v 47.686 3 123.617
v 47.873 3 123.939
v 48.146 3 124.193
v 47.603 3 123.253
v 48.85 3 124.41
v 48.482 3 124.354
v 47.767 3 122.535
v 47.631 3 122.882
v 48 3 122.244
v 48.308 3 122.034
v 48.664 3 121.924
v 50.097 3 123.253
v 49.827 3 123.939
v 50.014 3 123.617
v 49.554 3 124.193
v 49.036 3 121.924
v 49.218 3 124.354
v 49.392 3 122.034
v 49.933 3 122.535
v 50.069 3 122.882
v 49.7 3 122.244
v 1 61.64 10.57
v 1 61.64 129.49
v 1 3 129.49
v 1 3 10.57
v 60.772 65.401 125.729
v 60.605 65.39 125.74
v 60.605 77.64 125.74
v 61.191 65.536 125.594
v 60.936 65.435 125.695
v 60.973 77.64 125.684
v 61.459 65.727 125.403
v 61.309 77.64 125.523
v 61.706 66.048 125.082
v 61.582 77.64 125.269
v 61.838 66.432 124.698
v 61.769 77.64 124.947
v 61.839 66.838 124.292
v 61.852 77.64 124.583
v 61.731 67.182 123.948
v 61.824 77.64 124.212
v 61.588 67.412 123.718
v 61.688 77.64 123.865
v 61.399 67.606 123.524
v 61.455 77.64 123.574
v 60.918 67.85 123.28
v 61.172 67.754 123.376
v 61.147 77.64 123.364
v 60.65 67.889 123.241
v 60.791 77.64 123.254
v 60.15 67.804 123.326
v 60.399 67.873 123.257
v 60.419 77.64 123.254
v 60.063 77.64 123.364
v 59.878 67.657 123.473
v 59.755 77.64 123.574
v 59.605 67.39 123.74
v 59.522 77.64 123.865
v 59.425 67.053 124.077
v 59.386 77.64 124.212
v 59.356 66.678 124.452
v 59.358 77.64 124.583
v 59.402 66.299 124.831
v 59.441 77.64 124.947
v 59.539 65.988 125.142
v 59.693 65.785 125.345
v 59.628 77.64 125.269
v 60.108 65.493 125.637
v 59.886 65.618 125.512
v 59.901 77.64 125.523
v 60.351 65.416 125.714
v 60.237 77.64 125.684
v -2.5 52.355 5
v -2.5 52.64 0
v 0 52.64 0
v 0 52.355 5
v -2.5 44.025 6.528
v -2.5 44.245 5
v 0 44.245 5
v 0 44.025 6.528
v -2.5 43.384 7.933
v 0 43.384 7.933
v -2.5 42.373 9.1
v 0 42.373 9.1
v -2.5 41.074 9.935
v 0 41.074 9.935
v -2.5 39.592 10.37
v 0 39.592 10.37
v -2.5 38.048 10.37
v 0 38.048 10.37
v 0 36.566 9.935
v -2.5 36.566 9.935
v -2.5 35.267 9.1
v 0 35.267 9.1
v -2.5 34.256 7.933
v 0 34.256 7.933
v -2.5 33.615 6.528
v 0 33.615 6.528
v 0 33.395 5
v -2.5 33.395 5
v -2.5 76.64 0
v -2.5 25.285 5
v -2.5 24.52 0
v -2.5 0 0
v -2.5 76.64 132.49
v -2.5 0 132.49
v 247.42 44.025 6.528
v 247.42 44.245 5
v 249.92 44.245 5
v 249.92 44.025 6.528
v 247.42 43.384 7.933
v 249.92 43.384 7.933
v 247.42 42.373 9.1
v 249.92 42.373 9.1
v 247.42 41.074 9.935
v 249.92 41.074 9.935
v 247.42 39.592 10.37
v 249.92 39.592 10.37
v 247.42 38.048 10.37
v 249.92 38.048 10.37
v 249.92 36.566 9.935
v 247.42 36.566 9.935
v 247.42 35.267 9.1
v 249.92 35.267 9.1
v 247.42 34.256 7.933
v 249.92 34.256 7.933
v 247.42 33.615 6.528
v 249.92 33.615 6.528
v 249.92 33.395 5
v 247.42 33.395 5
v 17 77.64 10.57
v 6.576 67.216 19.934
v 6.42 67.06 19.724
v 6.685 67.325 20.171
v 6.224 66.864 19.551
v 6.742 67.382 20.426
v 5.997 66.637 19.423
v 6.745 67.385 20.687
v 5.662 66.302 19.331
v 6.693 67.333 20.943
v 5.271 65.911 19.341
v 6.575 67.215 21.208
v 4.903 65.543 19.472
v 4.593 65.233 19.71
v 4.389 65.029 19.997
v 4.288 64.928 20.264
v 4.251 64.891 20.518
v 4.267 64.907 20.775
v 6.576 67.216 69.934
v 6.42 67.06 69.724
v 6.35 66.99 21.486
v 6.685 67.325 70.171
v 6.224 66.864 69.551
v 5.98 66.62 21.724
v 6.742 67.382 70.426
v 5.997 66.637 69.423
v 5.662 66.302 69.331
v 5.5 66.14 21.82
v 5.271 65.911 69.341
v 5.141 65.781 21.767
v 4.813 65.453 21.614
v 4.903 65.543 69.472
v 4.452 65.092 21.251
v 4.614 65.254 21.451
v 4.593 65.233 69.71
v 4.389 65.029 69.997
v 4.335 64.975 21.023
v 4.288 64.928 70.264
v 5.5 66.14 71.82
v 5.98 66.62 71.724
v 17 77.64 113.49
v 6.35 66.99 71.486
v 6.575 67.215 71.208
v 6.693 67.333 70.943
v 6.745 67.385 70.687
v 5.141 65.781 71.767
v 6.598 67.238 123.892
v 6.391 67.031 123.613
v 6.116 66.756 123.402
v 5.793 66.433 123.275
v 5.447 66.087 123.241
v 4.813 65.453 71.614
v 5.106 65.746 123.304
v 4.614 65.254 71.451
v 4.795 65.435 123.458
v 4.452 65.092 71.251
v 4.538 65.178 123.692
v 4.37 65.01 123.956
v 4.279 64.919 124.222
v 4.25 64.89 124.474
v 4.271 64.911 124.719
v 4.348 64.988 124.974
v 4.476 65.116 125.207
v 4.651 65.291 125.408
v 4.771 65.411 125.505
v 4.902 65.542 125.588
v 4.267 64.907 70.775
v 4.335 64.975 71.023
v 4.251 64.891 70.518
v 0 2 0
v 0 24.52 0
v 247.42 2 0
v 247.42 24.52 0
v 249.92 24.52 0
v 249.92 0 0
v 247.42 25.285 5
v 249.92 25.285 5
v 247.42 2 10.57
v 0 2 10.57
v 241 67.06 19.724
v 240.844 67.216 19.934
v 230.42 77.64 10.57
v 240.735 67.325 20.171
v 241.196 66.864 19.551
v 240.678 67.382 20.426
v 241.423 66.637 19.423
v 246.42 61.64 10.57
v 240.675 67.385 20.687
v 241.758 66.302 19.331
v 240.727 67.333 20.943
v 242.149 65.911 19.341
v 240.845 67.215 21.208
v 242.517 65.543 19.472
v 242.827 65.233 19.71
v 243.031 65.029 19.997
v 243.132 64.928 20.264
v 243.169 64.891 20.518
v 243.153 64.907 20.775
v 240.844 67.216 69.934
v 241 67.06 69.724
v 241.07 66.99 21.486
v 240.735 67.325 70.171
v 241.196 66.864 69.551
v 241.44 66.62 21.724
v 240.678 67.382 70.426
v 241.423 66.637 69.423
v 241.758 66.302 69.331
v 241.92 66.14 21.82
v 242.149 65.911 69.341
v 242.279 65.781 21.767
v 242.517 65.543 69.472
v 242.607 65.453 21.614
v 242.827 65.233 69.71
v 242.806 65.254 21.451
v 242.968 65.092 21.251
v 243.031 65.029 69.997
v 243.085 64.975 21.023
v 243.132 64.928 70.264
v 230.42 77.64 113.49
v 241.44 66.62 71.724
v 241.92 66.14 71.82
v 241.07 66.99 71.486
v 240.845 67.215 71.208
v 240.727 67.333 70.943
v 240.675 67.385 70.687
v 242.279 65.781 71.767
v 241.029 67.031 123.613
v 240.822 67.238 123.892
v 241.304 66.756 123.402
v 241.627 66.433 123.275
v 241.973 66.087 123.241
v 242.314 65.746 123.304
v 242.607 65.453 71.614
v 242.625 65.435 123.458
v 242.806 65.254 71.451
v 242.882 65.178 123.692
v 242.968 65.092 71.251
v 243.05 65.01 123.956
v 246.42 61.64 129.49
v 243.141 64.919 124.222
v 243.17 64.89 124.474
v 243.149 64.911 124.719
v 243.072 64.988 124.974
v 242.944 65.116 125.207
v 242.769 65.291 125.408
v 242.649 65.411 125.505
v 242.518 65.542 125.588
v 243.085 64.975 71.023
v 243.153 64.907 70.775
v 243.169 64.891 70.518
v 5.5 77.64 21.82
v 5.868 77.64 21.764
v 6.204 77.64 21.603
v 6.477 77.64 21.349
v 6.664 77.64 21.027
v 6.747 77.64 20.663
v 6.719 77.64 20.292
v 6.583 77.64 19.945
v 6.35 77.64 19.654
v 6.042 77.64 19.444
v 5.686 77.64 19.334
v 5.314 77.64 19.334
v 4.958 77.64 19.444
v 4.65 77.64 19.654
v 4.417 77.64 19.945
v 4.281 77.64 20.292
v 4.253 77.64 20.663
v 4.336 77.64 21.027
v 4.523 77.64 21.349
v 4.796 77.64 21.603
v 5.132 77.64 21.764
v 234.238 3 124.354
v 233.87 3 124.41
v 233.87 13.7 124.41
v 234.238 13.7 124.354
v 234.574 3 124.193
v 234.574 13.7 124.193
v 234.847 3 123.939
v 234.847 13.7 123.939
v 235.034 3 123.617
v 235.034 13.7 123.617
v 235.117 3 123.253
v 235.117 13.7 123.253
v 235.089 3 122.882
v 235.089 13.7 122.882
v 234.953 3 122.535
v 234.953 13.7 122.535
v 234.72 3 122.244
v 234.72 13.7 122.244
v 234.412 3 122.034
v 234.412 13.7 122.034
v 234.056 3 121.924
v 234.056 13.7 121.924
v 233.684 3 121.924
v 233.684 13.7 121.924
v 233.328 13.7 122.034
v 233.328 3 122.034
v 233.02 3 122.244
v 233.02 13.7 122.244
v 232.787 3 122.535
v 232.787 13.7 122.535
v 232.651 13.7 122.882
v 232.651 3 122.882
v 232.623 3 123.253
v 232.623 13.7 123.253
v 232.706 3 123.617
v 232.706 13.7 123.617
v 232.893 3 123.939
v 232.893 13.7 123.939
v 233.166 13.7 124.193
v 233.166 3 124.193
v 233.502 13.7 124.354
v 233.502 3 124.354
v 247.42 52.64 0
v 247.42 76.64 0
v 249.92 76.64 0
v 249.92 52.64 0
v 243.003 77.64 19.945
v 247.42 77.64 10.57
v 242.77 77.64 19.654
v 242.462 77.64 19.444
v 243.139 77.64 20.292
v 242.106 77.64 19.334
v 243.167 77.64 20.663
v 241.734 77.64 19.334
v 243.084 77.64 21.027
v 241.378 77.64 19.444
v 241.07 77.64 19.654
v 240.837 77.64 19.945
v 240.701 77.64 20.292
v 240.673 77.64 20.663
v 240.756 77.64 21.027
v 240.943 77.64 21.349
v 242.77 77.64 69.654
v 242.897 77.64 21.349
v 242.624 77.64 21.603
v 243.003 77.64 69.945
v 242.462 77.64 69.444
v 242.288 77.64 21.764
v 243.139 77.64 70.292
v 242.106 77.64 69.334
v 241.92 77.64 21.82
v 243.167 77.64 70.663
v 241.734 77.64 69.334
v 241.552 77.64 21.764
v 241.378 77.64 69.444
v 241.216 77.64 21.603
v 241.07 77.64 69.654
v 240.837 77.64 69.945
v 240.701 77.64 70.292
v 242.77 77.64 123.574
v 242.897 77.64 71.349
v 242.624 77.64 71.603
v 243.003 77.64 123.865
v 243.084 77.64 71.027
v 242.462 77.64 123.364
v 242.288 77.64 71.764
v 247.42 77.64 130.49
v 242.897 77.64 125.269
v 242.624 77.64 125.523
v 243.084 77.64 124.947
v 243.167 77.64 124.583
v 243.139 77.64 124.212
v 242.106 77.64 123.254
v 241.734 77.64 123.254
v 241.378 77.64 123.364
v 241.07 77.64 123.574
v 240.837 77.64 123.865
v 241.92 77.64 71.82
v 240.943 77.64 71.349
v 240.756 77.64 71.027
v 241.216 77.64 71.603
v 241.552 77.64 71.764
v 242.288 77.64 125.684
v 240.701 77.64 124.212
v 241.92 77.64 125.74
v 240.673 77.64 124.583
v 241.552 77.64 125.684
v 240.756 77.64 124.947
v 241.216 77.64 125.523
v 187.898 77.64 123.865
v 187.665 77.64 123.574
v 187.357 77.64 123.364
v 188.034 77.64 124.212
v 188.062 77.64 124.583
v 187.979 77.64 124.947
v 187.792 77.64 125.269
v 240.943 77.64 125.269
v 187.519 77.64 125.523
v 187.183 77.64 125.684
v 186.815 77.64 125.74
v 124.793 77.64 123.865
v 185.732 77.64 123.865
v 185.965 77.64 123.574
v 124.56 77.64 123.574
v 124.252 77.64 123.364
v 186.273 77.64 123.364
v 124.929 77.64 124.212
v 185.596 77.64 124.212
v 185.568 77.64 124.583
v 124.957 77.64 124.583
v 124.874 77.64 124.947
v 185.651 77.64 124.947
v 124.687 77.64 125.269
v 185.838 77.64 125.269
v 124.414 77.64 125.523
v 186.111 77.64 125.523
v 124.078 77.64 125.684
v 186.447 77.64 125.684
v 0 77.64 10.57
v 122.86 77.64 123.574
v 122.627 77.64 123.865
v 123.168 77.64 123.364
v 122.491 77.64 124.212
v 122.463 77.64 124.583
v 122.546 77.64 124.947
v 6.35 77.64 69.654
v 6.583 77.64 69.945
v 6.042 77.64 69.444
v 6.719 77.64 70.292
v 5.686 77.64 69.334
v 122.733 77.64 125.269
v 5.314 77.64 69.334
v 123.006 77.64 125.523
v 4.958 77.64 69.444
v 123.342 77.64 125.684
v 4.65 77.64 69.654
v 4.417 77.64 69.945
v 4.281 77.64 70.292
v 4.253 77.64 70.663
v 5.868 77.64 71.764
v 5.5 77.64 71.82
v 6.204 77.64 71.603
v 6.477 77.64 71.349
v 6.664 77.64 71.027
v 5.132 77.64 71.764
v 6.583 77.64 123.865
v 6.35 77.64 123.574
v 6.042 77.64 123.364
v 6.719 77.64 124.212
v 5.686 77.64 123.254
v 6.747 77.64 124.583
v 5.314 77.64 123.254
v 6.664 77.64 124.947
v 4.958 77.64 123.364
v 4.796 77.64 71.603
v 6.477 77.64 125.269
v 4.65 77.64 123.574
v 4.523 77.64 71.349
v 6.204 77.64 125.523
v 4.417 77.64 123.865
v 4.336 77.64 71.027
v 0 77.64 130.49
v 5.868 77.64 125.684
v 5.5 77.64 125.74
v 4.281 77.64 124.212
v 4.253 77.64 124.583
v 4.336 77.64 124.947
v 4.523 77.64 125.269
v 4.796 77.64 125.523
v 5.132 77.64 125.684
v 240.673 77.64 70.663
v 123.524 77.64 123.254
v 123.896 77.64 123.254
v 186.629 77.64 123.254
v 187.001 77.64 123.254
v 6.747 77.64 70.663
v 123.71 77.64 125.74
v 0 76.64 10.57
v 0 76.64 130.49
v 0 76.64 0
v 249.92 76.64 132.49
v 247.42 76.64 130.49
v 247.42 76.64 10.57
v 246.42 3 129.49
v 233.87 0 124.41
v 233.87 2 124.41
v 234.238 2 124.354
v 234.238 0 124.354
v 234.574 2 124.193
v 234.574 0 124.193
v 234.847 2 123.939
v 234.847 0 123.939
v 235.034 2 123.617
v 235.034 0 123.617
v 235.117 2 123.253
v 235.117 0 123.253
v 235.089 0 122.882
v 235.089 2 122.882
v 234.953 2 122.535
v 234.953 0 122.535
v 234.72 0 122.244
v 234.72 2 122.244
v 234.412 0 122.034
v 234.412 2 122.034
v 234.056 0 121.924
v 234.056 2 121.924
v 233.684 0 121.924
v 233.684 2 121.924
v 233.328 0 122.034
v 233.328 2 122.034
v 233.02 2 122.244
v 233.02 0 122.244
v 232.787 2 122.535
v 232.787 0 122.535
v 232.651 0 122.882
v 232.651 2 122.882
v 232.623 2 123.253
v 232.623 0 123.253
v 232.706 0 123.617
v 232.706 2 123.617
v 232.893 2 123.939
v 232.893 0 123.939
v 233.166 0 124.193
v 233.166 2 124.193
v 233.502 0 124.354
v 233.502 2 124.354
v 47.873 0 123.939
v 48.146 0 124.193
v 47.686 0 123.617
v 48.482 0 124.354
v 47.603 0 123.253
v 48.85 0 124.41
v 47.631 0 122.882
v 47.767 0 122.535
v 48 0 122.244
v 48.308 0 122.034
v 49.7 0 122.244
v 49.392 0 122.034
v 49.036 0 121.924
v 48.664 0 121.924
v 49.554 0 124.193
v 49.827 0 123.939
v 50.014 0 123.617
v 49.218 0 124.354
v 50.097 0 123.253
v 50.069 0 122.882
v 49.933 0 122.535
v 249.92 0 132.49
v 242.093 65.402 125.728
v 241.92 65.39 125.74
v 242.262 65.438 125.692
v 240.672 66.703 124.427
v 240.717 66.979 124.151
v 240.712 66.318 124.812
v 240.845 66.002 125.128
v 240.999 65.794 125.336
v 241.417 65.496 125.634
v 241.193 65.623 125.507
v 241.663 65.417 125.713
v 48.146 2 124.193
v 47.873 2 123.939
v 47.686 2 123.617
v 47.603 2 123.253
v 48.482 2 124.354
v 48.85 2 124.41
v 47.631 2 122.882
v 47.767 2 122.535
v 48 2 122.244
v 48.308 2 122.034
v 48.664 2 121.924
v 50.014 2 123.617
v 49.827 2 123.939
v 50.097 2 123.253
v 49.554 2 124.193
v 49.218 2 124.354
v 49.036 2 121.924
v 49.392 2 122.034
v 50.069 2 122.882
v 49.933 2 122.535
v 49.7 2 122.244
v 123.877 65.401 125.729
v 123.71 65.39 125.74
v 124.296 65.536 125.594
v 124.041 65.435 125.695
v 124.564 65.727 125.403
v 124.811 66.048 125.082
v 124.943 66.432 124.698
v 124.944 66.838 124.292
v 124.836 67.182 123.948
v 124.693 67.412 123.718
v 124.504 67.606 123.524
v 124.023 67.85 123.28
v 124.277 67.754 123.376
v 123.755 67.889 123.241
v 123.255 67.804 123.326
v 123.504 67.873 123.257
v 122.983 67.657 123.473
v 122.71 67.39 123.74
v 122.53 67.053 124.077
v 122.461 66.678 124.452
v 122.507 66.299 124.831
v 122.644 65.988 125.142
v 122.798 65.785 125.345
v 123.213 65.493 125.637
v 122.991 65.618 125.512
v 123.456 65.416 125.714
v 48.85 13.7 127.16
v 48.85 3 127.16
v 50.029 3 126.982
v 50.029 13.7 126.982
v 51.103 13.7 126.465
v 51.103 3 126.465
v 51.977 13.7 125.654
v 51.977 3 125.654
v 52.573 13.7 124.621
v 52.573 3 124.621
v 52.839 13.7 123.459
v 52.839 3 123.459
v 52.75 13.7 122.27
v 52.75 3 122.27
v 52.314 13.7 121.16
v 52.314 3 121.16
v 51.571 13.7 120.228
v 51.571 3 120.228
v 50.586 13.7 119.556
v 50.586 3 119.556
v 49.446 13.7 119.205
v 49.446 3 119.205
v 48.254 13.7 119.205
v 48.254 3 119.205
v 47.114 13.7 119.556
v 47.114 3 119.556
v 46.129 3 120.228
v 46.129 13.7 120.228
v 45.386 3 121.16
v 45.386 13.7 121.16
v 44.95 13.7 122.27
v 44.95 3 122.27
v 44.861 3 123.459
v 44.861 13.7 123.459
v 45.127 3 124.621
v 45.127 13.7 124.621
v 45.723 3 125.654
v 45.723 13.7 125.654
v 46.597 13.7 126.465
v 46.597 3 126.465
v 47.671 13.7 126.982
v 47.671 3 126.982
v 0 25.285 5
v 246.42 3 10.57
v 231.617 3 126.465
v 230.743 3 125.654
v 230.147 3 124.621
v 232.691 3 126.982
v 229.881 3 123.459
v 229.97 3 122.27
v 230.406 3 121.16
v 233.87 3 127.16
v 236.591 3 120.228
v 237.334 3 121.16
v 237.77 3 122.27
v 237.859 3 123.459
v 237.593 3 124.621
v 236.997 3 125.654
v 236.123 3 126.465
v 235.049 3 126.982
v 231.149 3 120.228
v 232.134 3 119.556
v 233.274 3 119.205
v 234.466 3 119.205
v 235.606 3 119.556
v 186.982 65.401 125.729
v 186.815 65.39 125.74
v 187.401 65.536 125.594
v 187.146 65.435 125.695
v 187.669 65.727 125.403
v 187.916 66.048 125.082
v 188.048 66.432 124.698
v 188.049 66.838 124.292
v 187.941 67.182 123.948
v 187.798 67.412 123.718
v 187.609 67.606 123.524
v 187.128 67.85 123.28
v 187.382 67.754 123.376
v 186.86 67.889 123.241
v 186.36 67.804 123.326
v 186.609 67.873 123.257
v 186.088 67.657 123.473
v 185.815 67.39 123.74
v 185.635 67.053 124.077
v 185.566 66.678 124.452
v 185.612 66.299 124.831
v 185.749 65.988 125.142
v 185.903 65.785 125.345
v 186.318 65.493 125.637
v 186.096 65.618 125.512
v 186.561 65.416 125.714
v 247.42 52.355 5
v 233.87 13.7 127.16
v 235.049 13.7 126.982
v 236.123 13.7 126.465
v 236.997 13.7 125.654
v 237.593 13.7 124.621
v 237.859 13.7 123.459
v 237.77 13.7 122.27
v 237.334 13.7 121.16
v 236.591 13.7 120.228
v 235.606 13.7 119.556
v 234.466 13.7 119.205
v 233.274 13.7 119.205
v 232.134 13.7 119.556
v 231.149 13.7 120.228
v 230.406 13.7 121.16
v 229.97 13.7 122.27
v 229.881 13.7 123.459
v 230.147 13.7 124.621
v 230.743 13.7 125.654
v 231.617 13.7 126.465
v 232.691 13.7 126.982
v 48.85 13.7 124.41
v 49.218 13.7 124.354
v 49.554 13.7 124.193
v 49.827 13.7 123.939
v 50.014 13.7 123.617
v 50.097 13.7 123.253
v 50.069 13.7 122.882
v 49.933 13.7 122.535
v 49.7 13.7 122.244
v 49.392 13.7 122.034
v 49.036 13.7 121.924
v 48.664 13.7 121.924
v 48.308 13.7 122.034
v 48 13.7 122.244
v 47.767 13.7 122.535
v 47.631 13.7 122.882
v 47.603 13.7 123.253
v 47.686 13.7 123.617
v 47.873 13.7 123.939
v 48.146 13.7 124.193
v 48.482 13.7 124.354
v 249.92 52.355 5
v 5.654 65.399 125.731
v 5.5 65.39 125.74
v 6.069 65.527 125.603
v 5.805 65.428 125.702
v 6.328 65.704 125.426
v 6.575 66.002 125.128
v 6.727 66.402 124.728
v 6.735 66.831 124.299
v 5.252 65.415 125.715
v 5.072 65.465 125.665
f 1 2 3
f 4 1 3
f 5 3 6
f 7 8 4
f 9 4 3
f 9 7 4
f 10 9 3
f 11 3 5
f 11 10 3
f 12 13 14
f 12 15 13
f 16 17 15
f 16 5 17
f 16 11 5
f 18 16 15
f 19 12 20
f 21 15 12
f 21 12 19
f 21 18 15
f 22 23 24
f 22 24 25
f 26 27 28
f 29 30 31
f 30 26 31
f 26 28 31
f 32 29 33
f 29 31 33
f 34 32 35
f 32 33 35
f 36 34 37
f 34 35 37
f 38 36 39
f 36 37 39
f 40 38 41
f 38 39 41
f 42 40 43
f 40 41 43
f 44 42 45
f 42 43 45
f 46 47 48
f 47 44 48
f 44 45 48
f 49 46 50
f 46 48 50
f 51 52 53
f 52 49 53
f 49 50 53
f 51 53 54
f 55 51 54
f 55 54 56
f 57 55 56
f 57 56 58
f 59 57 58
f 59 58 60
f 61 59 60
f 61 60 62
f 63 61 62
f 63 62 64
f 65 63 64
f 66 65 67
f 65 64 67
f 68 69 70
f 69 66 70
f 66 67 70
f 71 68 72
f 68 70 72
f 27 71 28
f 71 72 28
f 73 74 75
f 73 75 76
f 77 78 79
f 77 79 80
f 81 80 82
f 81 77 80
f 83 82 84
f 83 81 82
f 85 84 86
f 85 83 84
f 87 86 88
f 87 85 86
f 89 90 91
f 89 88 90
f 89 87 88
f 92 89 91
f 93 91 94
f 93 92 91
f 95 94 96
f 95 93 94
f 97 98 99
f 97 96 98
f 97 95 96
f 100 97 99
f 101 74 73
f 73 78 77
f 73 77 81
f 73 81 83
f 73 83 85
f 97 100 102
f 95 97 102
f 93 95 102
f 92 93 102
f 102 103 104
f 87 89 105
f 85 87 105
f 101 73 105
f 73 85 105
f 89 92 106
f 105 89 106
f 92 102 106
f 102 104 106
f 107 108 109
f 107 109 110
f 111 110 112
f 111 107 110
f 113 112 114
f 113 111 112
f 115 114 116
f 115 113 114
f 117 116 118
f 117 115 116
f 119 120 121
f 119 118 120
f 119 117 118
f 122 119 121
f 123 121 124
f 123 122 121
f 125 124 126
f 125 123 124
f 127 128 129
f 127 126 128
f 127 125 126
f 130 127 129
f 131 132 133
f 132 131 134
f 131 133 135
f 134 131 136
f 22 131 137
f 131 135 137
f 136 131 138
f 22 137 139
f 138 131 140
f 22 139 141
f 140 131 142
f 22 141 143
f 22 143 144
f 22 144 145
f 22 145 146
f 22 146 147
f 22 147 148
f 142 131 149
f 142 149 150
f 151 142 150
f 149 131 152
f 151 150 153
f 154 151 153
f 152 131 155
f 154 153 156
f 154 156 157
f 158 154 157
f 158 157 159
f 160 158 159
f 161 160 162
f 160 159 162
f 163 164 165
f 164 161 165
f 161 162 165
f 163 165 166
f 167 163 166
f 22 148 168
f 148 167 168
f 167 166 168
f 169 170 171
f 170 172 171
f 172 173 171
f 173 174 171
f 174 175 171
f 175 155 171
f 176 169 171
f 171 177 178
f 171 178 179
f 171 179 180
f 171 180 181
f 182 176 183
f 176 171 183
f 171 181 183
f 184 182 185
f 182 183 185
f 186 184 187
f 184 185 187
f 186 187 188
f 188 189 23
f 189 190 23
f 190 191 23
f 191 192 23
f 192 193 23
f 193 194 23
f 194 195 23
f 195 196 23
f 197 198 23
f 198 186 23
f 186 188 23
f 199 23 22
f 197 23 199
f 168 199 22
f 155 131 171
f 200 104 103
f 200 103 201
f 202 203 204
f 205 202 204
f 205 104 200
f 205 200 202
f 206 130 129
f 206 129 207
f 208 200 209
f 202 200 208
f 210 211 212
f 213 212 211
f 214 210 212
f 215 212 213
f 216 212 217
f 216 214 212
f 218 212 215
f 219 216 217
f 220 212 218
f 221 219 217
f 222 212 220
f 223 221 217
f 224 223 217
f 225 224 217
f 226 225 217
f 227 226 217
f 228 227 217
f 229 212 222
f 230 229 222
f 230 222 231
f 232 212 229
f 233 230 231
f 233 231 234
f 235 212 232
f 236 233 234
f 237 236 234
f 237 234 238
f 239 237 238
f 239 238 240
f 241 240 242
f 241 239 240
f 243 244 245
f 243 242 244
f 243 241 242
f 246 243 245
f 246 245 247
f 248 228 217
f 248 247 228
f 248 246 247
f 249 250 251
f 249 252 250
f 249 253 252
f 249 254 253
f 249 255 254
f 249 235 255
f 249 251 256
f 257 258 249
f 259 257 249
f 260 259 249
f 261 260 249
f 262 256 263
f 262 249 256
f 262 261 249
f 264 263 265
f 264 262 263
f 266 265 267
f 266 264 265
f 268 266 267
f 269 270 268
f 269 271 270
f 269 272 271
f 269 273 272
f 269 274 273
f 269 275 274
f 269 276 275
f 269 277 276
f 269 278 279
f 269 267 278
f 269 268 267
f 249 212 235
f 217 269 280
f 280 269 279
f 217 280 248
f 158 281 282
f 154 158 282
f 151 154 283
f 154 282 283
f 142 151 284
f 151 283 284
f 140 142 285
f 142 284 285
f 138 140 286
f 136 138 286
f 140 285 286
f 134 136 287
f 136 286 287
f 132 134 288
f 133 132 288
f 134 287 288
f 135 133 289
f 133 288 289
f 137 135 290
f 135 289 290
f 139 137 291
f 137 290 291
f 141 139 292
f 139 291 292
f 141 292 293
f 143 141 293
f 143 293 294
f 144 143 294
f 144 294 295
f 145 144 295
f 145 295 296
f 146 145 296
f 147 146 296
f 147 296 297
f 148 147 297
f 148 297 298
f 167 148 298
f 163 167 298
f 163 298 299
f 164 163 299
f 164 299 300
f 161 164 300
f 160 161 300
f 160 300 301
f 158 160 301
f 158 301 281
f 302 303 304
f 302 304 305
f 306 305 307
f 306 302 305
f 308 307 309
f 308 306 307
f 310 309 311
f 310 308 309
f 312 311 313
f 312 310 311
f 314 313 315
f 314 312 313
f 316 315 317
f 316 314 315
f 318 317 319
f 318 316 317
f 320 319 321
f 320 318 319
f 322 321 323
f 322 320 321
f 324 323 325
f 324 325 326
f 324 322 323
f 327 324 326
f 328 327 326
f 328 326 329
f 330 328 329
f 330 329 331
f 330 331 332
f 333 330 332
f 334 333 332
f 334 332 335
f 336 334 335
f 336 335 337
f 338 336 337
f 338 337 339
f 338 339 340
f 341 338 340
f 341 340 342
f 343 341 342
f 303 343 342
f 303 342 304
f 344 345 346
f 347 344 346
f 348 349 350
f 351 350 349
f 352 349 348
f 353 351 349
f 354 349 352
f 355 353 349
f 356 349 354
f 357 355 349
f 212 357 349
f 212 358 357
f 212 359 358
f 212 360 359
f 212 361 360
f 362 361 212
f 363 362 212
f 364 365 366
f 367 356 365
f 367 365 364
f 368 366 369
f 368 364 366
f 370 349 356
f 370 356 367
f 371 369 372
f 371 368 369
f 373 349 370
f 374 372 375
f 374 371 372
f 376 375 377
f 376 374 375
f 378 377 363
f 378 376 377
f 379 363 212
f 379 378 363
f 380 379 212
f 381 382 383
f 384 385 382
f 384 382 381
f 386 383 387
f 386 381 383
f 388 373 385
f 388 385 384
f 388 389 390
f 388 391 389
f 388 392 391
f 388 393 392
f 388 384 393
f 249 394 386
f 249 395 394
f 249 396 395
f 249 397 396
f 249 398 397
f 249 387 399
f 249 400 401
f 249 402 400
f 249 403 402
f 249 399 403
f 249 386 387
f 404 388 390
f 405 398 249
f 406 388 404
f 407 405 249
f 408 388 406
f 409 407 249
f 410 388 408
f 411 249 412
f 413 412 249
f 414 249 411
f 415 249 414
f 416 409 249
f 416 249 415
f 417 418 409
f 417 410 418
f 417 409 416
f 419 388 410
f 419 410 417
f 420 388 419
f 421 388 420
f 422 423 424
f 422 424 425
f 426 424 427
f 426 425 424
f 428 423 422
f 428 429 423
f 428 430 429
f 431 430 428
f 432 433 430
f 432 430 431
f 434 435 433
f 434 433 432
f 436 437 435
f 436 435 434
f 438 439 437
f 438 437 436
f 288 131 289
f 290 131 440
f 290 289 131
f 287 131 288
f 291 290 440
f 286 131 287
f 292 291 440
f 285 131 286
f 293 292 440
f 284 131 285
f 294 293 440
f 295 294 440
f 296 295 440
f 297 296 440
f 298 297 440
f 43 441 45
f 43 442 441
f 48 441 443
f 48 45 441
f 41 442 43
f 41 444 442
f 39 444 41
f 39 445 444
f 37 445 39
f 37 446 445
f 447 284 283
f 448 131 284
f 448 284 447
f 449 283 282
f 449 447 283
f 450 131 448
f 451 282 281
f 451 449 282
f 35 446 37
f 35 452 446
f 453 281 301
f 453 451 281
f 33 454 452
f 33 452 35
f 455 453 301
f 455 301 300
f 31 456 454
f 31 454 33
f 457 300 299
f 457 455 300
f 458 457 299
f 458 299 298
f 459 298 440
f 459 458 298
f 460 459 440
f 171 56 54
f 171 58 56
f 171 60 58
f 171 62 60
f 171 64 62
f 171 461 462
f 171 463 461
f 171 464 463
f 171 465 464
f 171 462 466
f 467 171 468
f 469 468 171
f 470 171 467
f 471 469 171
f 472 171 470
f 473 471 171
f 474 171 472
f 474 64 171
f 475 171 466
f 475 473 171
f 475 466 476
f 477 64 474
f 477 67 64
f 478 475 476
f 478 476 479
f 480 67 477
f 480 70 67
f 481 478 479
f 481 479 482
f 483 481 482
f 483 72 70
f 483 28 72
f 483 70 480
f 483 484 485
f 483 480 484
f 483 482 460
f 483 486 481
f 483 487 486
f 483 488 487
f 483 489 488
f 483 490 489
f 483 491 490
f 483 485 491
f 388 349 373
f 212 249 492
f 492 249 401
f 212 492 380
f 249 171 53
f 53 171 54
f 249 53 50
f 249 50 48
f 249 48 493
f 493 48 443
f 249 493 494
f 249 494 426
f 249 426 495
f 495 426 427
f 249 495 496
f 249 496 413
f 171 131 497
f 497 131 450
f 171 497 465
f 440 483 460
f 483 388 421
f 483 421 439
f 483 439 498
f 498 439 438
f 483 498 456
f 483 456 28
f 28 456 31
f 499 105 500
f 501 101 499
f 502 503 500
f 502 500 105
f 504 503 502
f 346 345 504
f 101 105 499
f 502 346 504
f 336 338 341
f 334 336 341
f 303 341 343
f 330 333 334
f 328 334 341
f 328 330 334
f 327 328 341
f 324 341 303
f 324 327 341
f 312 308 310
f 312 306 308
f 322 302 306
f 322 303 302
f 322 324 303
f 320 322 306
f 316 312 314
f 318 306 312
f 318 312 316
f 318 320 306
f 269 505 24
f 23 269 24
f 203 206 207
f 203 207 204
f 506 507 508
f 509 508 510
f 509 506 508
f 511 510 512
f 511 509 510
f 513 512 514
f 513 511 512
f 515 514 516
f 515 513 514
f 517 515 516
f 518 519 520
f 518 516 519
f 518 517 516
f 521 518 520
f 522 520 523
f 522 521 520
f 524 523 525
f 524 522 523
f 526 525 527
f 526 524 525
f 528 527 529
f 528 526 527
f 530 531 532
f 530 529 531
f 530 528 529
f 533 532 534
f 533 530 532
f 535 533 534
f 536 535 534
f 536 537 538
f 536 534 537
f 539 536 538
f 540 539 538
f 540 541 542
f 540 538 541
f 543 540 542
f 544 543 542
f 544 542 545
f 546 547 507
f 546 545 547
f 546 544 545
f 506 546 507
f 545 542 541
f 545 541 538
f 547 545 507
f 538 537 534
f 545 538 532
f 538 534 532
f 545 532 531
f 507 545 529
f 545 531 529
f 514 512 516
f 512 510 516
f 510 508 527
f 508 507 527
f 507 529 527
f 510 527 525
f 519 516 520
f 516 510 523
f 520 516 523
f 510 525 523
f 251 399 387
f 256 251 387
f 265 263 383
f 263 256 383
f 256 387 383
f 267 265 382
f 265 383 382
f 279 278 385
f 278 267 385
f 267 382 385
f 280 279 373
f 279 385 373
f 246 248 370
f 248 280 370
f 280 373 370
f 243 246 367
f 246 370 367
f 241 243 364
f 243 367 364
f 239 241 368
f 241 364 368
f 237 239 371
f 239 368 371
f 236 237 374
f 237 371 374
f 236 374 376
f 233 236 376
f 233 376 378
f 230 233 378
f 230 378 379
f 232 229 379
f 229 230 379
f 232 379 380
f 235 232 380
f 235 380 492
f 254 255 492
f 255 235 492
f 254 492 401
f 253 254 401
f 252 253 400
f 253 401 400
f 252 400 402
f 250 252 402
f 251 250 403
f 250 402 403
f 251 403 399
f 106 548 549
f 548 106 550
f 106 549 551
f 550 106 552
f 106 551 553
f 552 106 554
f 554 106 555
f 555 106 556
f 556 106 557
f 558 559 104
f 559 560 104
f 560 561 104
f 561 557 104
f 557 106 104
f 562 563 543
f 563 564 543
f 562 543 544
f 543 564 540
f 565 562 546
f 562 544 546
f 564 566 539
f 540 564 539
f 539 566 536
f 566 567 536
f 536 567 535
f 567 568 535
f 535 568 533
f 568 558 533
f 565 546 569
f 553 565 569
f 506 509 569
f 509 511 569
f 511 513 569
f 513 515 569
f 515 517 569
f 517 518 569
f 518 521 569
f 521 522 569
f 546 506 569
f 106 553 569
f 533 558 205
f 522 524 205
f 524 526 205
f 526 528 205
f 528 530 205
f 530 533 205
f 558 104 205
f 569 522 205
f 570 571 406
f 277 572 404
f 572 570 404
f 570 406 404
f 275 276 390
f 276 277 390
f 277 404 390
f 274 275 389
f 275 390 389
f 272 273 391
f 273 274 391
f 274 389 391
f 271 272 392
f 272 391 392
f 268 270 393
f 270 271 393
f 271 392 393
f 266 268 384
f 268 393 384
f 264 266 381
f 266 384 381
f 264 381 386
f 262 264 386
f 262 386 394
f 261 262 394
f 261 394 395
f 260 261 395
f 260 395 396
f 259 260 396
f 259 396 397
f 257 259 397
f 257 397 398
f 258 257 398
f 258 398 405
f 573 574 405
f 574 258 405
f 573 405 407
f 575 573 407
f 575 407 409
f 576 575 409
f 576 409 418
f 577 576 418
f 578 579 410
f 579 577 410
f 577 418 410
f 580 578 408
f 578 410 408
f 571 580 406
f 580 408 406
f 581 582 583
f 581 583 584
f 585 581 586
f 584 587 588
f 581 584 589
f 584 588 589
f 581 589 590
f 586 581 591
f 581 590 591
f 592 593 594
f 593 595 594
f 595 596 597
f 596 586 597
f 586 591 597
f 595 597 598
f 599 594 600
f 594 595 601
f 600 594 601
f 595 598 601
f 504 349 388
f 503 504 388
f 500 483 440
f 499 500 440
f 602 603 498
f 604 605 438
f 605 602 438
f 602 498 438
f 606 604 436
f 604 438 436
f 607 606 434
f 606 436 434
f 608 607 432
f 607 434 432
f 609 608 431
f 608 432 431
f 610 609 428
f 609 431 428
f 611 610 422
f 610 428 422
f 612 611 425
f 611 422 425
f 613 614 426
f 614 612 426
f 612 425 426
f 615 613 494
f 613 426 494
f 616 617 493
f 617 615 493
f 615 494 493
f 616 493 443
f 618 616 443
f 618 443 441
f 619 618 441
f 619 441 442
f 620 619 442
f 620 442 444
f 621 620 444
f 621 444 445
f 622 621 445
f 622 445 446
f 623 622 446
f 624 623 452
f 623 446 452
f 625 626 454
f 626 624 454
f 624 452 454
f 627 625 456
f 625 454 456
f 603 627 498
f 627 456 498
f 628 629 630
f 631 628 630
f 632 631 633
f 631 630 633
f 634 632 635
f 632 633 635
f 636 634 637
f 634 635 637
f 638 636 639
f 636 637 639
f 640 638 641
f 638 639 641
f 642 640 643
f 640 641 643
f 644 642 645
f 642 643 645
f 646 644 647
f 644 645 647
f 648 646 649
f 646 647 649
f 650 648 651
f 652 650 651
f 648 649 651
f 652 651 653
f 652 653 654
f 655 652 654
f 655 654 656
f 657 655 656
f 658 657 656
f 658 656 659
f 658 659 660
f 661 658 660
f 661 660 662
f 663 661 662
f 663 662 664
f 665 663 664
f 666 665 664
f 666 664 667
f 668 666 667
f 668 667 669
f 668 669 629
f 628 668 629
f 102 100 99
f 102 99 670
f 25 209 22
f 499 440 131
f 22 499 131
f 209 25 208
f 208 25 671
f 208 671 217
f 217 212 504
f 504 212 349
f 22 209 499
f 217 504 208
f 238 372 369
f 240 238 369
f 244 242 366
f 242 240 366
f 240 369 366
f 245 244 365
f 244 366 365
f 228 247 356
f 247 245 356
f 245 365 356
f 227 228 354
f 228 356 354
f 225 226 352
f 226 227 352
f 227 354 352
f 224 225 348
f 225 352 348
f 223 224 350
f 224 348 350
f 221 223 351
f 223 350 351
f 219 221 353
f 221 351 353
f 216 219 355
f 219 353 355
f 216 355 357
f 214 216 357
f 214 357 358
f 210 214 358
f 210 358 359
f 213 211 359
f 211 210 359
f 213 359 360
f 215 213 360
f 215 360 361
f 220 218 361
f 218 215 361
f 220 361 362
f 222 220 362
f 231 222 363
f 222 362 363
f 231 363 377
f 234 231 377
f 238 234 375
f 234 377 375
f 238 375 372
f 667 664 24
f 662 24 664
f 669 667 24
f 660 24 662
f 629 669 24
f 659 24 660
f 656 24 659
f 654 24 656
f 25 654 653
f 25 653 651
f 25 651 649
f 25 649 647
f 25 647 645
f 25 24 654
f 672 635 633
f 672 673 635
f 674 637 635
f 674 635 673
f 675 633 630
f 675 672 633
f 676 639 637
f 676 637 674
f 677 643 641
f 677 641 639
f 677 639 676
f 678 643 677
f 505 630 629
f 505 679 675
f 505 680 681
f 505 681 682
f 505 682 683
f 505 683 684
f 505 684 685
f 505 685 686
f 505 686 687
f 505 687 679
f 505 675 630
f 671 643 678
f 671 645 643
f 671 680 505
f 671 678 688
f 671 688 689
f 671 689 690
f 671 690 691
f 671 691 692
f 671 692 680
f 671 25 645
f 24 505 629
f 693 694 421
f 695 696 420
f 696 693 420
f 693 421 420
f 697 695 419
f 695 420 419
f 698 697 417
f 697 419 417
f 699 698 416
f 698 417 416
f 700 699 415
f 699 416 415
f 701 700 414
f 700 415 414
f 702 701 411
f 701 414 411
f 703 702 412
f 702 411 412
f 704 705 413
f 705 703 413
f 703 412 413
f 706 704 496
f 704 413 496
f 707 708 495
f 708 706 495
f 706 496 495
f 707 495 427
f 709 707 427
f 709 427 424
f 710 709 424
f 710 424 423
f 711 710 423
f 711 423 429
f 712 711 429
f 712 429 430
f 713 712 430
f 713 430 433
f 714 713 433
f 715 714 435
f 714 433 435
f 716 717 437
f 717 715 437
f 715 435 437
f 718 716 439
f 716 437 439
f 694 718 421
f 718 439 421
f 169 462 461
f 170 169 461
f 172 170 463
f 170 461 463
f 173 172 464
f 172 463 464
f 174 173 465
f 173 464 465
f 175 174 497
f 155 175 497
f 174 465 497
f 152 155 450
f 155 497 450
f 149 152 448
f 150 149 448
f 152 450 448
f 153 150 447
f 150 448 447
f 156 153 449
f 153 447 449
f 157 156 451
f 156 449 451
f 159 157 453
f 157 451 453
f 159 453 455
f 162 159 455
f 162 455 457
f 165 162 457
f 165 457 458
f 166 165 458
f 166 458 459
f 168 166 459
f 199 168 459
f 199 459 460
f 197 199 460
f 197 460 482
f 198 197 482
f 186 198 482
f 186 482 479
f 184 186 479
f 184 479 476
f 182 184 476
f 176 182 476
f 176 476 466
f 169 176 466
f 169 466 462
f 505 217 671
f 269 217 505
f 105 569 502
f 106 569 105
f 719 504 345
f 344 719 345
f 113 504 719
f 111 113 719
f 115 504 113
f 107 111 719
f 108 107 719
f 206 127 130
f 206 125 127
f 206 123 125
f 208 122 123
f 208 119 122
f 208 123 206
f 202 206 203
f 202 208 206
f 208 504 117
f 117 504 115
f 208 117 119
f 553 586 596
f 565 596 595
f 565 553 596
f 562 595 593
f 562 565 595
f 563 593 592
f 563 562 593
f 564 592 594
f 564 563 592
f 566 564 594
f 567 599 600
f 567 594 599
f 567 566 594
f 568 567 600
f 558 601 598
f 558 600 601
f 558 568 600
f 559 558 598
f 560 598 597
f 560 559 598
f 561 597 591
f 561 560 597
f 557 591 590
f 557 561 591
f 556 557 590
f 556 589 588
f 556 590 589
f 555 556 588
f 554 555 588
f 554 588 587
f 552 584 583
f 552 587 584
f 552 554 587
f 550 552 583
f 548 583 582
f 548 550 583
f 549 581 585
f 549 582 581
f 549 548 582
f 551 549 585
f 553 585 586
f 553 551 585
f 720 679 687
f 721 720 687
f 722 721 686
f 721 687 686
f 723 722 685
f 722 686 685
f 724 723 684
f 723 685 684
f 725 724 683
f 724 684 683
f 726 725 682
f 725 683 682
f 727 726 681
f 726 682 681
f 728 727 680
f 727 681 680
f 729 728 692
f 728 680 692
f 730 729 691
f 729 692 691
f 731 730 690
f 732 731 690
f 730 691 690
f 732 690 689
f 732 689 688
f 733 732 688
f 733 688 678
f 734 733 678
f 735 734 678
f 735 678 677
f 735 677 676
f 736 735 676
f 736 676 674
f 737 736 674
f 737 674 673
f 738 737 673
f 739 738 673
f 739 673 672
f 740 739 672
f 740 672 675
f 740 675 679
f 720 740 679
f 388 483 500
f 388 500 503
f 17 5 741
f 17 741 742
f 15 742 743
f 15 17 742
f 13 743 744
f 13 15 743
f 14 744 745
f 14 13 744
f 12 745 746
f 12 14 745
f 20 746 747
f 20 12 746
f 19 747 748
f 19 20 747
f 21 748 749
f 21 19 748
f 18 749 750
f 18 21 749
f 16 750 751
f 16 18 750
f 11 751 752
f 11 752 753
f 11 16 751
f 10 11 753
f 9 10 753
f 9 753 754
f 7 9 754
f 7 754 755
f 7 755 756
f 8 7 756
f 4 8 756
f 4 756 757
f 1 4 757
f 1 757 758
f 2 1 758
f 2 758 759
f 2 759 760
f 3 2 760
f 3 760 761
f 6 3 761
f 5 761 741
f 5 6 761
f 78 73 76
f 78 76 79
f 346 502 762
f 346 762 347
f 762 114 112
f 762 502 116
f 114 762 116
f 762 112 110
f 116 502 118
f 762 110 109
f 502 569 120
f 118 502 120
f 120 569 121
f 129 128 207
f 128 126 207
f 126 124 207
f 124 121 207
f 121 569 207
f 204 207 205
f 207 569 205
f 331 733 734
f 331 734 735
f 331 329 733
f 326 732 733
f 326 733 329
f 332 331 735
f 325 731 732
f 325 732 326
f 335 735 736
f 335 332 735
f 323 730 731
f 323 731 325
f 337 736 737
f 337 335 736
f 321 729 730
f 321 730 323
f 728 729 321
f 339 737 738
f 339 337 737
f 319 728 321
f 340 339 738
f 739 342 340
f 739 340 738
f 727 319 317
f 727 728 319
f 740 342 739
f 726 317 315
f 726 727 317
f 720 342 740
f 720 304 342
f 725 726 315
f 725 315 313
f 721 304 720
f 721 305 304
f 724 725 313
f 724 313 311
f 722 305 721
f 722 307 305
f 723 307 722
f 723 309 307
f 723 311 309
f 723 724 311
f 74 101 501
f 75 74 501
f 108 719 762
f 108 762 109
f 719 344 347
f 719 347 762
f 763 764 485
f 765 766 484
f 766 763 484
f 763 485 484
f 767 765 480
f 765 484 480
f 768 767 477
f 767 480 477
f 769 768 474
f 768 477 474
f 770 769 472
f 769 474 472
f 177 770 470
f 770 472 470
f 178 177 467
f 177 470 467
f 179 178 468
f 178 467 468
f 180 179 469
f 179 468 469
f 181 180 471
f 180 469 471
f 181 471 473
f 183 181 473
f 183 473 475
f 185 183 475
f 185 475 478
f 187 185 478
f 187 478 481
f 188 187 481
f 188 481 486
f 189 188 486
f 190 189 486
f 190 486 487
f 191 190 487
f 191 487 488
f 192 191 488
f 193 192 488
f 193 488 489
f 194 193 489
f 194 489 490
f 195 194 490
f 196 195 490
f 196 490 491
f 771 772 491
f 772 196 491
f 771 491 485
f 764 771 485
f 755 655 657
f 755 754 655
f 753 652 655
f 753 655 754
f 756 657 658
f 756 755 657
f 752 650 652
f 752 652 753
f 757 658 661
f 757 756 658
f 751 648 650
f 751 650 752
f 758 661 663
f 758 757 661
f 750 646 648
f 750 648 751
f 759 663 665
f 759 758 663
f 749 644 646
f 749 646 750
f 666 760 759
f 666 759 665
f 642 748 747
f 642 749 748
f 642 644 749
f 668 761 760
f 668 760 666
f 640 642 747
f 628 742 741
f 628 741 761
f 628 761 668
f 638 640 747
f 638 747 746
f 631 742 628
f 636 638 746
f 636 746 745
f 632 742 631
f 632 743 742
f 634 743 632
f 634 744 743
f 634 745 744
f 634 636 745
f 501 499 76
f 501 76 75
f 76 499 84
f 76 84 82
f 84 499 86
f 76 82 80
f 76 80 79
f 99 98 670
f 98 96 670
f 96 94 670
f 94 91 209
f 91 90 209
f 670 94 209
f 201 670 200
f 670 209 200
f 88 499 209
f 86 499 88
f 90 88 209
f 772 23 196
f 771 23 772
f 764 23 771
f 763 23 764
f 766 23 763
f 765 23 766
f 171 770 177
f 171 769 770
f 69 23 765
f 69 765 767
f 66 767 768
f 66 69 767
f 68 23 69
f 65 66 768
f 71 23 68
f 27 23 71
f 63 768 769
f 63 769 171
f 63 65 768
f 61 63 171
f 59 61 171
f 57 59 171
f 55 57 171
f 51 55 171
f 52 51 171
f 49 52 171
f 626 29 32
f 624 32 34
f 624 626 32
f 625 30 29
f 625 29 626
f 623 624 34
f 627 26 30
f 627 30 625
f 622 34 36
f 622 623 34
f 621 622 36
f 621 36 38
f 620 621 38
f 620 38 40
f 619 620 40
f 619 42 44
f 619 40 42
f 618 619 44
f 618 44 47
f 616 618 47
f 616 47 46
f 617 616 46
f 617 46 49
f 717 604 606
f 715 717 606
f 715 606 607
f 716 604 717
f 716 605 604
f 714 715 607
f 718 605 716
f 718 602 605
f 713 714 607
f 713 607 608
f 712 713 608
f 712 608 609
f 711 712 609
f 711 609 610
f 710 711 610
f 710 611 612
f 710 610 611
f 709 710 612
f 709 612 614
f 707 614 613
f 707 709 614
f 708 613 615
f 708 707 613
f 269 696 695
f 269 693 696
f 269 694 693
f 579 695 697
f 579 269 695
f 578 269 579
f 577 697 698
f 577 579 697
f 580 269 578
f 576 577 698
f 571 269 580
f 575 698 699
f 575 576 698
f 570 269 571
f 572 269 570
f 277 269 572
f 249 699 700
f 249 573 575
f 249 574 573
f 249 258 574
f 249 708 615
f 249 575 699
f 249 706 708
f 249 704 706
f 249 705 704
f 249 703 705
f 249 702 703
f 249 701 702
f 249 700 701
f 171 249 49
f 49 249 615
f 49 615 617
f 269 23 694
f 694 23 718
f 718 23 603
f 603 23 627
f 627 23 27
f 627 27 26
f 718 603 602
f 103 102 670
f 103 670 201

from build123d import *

# Parameters (mm, degrees)
SKETCH1_W               = 247.42
SKETCH1_H               = 129.49
SKETCH1_R               = 4
SKETCH1_W_2             = 2.5
SKETCH1_R_2             = 1.25
BOSS_EXTRUDE1_DEPTH     = 2
BOSS_EXTRUDE2_START     = 2
SKETCH1_6_R             = 4
SKETCH1_6_R_2           = 1.25
BOSS_EXTRUDE2_DEPTH     = 11.7
BOSS_EXTRUDE3_START     = 2
SKETCH1_7_W             = 2.5
SKETCH1_7_H             = 129.49
BOSS_EXTRUDE3_DEPTH     = 75.64
SKETCH2_W               = 247.42
SKETCH2_H               = 118.92
BOSS_EXTRUDE4_DEPTH     = 1
SKETCH3_W               = 118.92
SKETCH3_H               = 74.64
BOSS_EXTRUDE5_DEPTH     = 1
SKETCH4_W               = 118.92
SKETCH4_H               = 74.64
BOSS_EXTRUDE6_DEPTH     = 1
CUT_EXTRUDE1_DEPTH      = 296.461378356
CUT_EXTRUDE1_DEPTH_BACK = 296.461378356
BOSS_EXTRUDE7_DEPTH     = 118.92
BOSS_EXTRUDE8_REACH     = 297.461
CUT_EXTRUDE2_REACH      = 295.328
SKETCH8_R               = 1.25
SKETCH9_W               = 247.42
SKETCH9_H               = 2
CUT_EXTRUDE3_DEPTH      = 1


with BuildPart() as part:
    # Sketch1 → Boss-Extrude1 (new body)
    # profile 1 of 6: a face of its own
    with BuildSketch(Plane(origin=(0, 0, 0), x_dir=(1, 0, 0), z_dir=(0, 1, 0))):
        with Locations((123.71, -64.745)):
            Rectangle(SKETCH1_W, SKETCH1_H)
        with Locations((48.85, -123.16)):
            Circle(SKETCH1_R, mode=Mode.SUBTRACT)
        with Locations((233.87, -123.16)):
            Circle(SKETCH1_R, mode=Mode.SUBTRACT)
    # profile 2 of 6: a face of its own
    with BuildSketch(Plane(origin=(0, 0, 0), x_dir=(1, 0, 0), z_dir=(0, 1, 0))):
        with Locations((-1.25, -64.745)):
            Rectangle(SKETCH1_W_2, SKETCH1_H)
    # profile 3 of 6: a face of its own
    with BuildSketch(Plane(origin=(0, 0, 0), x_dir=(1, 0, 0), z_dir=(0, 1, 0))):
        Polygon((249.92, -129.49), (249.92, -132.49), (-2.5, -132.49), (-2.5, -129.49), (0, -129.49), (247.42, -129.49), align=None)
    # profile 4 of 6: a face of its own
    with BuildSketch(Plane(origin=(0, 0, 0), x_dir=(1, 0, 0), z_dir=(0, 1, 0))):
        with Locations((248.67, -64.745)):
            Rectangle(SKETCH1_W_2, SKETCH1_H)
    # profile 5 of 6: a face of its own
    with BuildSketch(Plane(origin=(0, 0, 0), x_dir=(1, 0, 0), z_dir=(0, 1, 0))):
        with Locations((233.87, -123.16)):
            Circle(SKETCH1_R)
        with Locations(Location((233.87, -123.16, 0), (0, 0, 270))):
            Circle(SKETCH1_R_2, mode=Mode.SUBTRACT)
    # profile 6 of 6: a face of its own
    with BuildSketch(Plane(origin=(0, 0, 0), x_dir=(1, 0, 0), z_dir=(0, 1, 0))):
        with Locations((48.85, -123.16)):
            Circle(SKETCH1_R)
        with Locations(Location((48.85, -123.16, 0), (0, 0, 270))):
            Circle(SKETCH1_R_2, mode=Mode.SUBTRACT)
    extrude(amount=BOSS_EXTRUDE1_DEPTH)

    # Sketch1<6> → Boss-Extrude2 (add)
    # profile 1 of 2: a face of its own
    with BuildSketch(Plane(origin=(0, 0, 0), x_dir=(1, 0, 0), z_dir=(0, 1, 0)).offset(BOSS_EXTRUDE2_START)):
        with Locations(Location((48.85, -123.16, 0), (0, 0, 270))):
            Circle(SKETCH1_6_R)
        with Locations(Location((48.85, -123.16, 0), (0, 0, 270))):
            Circle(SKETCH1_6_R_2, mode=Mode.SUBTRACT)
    # profile 2 of 2: a face of its own
    with BuildSketch(Plane(origin=(0, 0, 0), x_dir=(1, 0, 0), z_dir=(0, 1, 0)).offset(BOSS_EXTRUDE2_START)):
        with Locations(Location((233.87, -123.16, 0), (0, 0, 270))):
            Circle(SKETCH1_6_R)
        with Locations(Location((233.87, -123.16, 0), (0, 0, 270))):
            Circle(SKETCH1_6_R_2, mode=Mode.SUBTRACT)
    extrude(amount=BOSS_EXTRUDE2_DEPTH)

    # Sketch1<7> → Boss-Extrude3 (add)
    with BuildSketch(Plane(origin=(0, 0, 0), x_dir=(1, 0, 0), z_dir=(0, 1, 0)).offset(BOSS_EXTRUDE3_START)):
        with Locations((-1.25, -64.745)):
            Rectangle(SKETCH1_7_W, SKETCH1_7_H)
        Polygon((249.92, -129.49), (249.92, -132.49), (-2.5, -132.49), (-2.5, -129.49), (0, -129.49), (247.42, -129.49), align=None)
        with Locations((248.67, -64.745)):
            Rectangle(SKETCH1_7_W, SKETCH1_7_H)
    extrude(amount=BOSS_EXTRUDE3_DEPTH)

    # Sketch2 → Boss-Extrude4 (add)
    with BuildSketch(Plane(origin=(0, 2, 0), x_dir=(1, 0, 0), z_dir=(0, 1, 0))):
        with Locations((123.71, -70.03)):
            Rectangle(SKETCH2_W, SKETCH2_H)
    extrude(amount=BOSS_EXTRUDE4_DEPTH)

    # Sketch3 → Boss-Extrude5 (add)
    with BuildSketch(Plane(origin=(0, 0, 0), x_dir=(0, 0, -1), z_dir=(1, 0, 0))):
        with Locations((-70.03, 40.32)):
            Rectangle(SKETCH3_W, SKETCH3_H)
    extrude(amount=BOSS_EXTRUDE5_DEPTH)

    # Sketch4 → Boss-Extrude6 (add)
    with BuildSketch(Plane.ZY.offset(-247.42)):
        with Locations((70.03, 40.32)):
            Rectangle(SKETCH4_W, SKETCH4_H)
    extrude(amount=BOSS_EXTRUDE6_DEPTH)

    # Sketch5 → Cut-Extrude1 (cut, two sides: drawn at the far end of the back side and taken through both)
    with BuildSketch(Plane(origin=(249.92, 0, 0), x_dir=(0, 0, -1), z_dir=(1, 0, 0)).offset(-CUT_EXTRUDE1_DEPTH_BACK)):
        Polygon((-5, 25.285), (0, 24.52), (0, 52.64), (-5, 52.355), (-5, 44.245), (-5, 33.395), align=None)
        with BuildLine():
            ThreePointArc((-5, 44.245), (-10.425, 38.82), (-5, 33.395))
            Line((-5, 33.395), (-5, 44.245))
        make_face()
    extrude(amount=CUT_EXTRUDE1_DEPTH + CUT_EXTRUDE1_DEPTH_BACK, mode=Mode.SUBTRACT)

    # Sketch6 → Boss-Extrude7 (add)
    with BuildSketch(Plane(origin=(0, 0, 129.49), x_dir=(-1, 0, 0), z_dir=(0, 0, -1))):
        Polygon((-246.42, 77.64), (-230.42, 77.64), (-246.42, 61.64), align=None)
        Polygon((-1, 77.64), (-17, 77.64), (-1, 61.64), align=None)
    extrude(amount=BOSS_EXTRUDE7_DEPTH)

    # Boss-Extrude8: up to this plane
    boss_extrude8_end = Plane(origin=(17, 77.64, -12.057416998), z_dir=(-0.7071067811865476, 0.7071067811865476, 0))
    # Sketch7 → Boss-Extrude8 (add, up to the surface)
    with BuildSketch(Plane(origin=(249.92, 0, 0), x_dir=(0, 0, -1), z_dir=(1, 0, 0)), mode=Mode.PRIVATE) as boss_extrude8_sk1:
        Polygon((-132.49, 77.64), (-132.49, 61.64), (-129.49, 61.64), (-113.49, 77.64), align=None)
    boss_extrude8_tool1 = split(extrude(boss_extrude8_sk1.sketch, amount=-BOSS_EXTRUDE8_REACH, mode=Mode.PRIVATE), bisect_by=boss_extrude8_end, keep=Keep.BOTH, mode=Mode.PRIVATE)
    add(boss_extrude8_tool1.solids().sort_by_distance((249.92, 71.579394, 126.020303))[0])

    # Sketch8 → Cut-Extrude2 (cut, up to next)
    with BuildSketch(Plane(origin=(0, 77.64, 0), x_dir=(1, 0, 0), z_dir=(0, 1, 0)), mode=Mode.PRIVATE) as cut_extrude2_sk1:
        with Locations(Location((5.5, -124.49, 0), (0, 0, 270))):
            Circle(SKETCH8_R)
    cut_extrude2_tool1 = extrude(cut_extrude2_sk1.sketch, amount=-CUT_EXTRUDE2_REACH, mode=Mode.PRIVATE) & part.part
    # Sketch8 → Cut-Extrude2 (cut, up to next)
    with BuildSketch(Plane(origin=(0, 77.64, 0), x_dir=(1, 0, 0), z_dir=(0, 1, 0)), mode=Mode.PRIVATE) as cut_extrude2_sk2:
        with Locations(Location((241.92, -124.49, 0), (0, 0, 270))):
            Circle(SKETCH8_R)
    cut_extrude2_tool2 = extrude(cut_extrude2_sk2.sketch, amount=-CUT_EXTRUDE2_REACH, mode=Mode.PRIVATE) & part.part
    # Sketch8 → Cut-Extrude2 (cut, up to next)
    with BuildSketch(Plane(origin=(0, 77.64, 0), x_dir=(1, 0, 0), z_dir=(0, 1, 0)), mode=Mode.PRIVATE) as cut_extrude2_sk3:
        with Locations(Location((60.605, -124.49, 0), (0, 0, 270))):
            Circle(SKETCH8_R)
    cut_extrude2_tool3 = extrude(cut_extrude2_sk3.sketch, amount=-CUT_EXTRUDE2_REACH, mode=Mode.PRIVATE) & part.part
    # Sketch8 → Cut-Extrude2 (cut, up to next)
    with BuildSketch(Plane(origin=(0, 77.64, 0), x_dir=(1, 0, 0), z_dir=(0, 1, 0)), mode=Mode.PRIVATE) as cut_extrude2_sk4:
        with Locations(Location((186.815, -124.49, 0), (0, 0, 270))):
            Circle(SKETCH8_R)
    cut_extrude2_tool4 = extrude(cut_extrude2_sk4.sketch, amount=-CUT_EXTRUDE2_REACH, mode=Mode.PRIVATE) & part.part
    # Sketch8 → Cut-Extrude2 (cut, up to next)
    with BuildSketch(Plane(origin=(0, 77.64, 0), x_dir=(1, 0, 0), z_dir=(0, 1, 0)), mode=Mode.PRIVATE) as cut_extrude2_sk5:
        with Locations(Location((123.71, -124.49, 0), (0, 0, 270))):
            Circle(SKETCH8_R)
    cut_extrude2_tool5 = extrude(cut_extrude2_sk5.sketch, amount=-CUT_EXTRUDE2_REACH, mode=Mode.PRIVATE) & part.part
    # Sketch8 → Cut-Extrude2 (cut, up to next)
    with BuildSketch(Plane(origin=(0, 77.64, 0), x_dir=(1, 0, 0), z_dir=(0, 1, 0)), mode=Mode.PRIVATE) as cut_extrude2_sk6:
        with Locations(Location((5.5, -70.57, 0), (0, 0, 270))):
            Circle(SKETCH8_R)
    cut_extrude2_tool6 = extrude(cut_extrude2_sk6.sketch, amount=-CUT_EXTRUDE2_REACH, mode=Mode.PRIVATE) & part.part
    # Sketch8 → Cut-Extrude2 (cut, up to next)
    with BuildSketch(Plane(origin=(0, 77.64, 0), x_dir=(1, 0, 0), z_dir=(0, 1, 0)), mode=Mode.PRIVATE) as cut_extrude2_sk7:
        with Locations(Location((5.5, -20.57, 0), (0, 0, 270))):
            Circle(SKETCH8_R)
    cut_extrude2_tool7 = extrude(cut_extrude2_sk7.sketch, amount=-CUT_EXTRUDE2_REACH, mode=Mode.PRIVATE) & part.part
    # Sketch8 → Cut-Extrude2 (cut, up to next)
    with BuildSketch(Plane(origin=(0, 77.64, 0), x_dir=(1, 0, 0), z_dir=(0, 1, 0)), mode=Mode.PRIVATE) as cut_extrude2_sk8:
        with Locations(Location((241.92, -20.57, 0), (0, 0, 270))):
            Circle(SKETCH8_R)
    cut_extrude2_tool8 = extrude(cut_extrude2_sk8.sketch, amount=-CUT_EXTRUDE2_REACH, mode=Mode.PRIVATE) & part.part
    # Sketch8 → Cut-Extrude2 (cut, up to next)
    with BuildSketch(Plane(origin=(0, 77.64, 0), x_dir=(1, 0, 0), z_dir=(0, 1, 0)), mode=Mode.PRIVATE) as cut_extrude2_sk9:
        with Locations(Location((241.92, -70.57, 0), (0, 0, 270))):
            Circle(SKETCH8_R)
    cut_extrude2_tool9 = extrude(cut_extrude2_sk9.sketch, amount=-CUT_EXTRUDE2_REACH, mode=Mode.PRIVATE) & part.part
    add(cut_extrude2_tool1.solids().sort_by_distance((5.5, 77.64, 124.49))[0], mode=Mode.SUBTRACT)
    add(cut_extrude2_tool2.solids().sort_by_distance((241.92, 77.64, 124.49))[0], mode=Mode.SUBTRACT)
    add(cut_extrude2_tool3.solids().sort_by_distance((60.605, 77.64, 124.49))[0], mode=Mode.SUBTRACT)
    add(cut_extrude2_tool4.solids().sort_by_distance((186.815, 77.64, 124.49))[0], mode=Mode.SUBTRACT)
    add(cut_extrude2_tool5.solids().sort_by_distance((123.71, 77.64, 124.49))[0], mode=Mode.SUBTRACT)
    add(cut_extrude2_tool6.solids().sort_by_distance((5.5, 77.64, 70.57))[0], mode=Mode.SUBTRACT)
    add(cut_extrude2_tool7.solids().sort_by_distance((5.5, 77.64, 20.57))[0], mode=Mode.SUBTRACT)
    add(cut_extrude2_tool8.solids().sort_by_distance((241.92, 77.64, 20.57))[0], mode=Mode.SUBTRACT)
    add(cut_extrude2_tool9.solids().sort_by_distance((241.92, 77.64, 70.57))[0], mode=Mode.SUBTRACT)

    # Sketch9 → Cut-Extrude3 (cut)
    with BuildSketch(Plane(origin=(0, 77.64, 0), x_dir=(1, 0, 0), z_dir=(0, 1, 0))):
        Polygon((0, 0), (-2.5, 0), (-2.5, -132.49), (0, -132.49), (0, -130.49), align=None)
        with Locations((123.71, -131.49)):
            Rectangle(SKETCH9_W, SKETCH9_H)
        Polygon((247.42, 0), (247.42, -130.49), (247.42, -132.49), (249.92, -132.49), (249.92, 0), align=None)
    extrude(amount=-CUT_EXTRUDE3_DEPTH, mode=Mode.SUBTRACT)


solid = part.part
